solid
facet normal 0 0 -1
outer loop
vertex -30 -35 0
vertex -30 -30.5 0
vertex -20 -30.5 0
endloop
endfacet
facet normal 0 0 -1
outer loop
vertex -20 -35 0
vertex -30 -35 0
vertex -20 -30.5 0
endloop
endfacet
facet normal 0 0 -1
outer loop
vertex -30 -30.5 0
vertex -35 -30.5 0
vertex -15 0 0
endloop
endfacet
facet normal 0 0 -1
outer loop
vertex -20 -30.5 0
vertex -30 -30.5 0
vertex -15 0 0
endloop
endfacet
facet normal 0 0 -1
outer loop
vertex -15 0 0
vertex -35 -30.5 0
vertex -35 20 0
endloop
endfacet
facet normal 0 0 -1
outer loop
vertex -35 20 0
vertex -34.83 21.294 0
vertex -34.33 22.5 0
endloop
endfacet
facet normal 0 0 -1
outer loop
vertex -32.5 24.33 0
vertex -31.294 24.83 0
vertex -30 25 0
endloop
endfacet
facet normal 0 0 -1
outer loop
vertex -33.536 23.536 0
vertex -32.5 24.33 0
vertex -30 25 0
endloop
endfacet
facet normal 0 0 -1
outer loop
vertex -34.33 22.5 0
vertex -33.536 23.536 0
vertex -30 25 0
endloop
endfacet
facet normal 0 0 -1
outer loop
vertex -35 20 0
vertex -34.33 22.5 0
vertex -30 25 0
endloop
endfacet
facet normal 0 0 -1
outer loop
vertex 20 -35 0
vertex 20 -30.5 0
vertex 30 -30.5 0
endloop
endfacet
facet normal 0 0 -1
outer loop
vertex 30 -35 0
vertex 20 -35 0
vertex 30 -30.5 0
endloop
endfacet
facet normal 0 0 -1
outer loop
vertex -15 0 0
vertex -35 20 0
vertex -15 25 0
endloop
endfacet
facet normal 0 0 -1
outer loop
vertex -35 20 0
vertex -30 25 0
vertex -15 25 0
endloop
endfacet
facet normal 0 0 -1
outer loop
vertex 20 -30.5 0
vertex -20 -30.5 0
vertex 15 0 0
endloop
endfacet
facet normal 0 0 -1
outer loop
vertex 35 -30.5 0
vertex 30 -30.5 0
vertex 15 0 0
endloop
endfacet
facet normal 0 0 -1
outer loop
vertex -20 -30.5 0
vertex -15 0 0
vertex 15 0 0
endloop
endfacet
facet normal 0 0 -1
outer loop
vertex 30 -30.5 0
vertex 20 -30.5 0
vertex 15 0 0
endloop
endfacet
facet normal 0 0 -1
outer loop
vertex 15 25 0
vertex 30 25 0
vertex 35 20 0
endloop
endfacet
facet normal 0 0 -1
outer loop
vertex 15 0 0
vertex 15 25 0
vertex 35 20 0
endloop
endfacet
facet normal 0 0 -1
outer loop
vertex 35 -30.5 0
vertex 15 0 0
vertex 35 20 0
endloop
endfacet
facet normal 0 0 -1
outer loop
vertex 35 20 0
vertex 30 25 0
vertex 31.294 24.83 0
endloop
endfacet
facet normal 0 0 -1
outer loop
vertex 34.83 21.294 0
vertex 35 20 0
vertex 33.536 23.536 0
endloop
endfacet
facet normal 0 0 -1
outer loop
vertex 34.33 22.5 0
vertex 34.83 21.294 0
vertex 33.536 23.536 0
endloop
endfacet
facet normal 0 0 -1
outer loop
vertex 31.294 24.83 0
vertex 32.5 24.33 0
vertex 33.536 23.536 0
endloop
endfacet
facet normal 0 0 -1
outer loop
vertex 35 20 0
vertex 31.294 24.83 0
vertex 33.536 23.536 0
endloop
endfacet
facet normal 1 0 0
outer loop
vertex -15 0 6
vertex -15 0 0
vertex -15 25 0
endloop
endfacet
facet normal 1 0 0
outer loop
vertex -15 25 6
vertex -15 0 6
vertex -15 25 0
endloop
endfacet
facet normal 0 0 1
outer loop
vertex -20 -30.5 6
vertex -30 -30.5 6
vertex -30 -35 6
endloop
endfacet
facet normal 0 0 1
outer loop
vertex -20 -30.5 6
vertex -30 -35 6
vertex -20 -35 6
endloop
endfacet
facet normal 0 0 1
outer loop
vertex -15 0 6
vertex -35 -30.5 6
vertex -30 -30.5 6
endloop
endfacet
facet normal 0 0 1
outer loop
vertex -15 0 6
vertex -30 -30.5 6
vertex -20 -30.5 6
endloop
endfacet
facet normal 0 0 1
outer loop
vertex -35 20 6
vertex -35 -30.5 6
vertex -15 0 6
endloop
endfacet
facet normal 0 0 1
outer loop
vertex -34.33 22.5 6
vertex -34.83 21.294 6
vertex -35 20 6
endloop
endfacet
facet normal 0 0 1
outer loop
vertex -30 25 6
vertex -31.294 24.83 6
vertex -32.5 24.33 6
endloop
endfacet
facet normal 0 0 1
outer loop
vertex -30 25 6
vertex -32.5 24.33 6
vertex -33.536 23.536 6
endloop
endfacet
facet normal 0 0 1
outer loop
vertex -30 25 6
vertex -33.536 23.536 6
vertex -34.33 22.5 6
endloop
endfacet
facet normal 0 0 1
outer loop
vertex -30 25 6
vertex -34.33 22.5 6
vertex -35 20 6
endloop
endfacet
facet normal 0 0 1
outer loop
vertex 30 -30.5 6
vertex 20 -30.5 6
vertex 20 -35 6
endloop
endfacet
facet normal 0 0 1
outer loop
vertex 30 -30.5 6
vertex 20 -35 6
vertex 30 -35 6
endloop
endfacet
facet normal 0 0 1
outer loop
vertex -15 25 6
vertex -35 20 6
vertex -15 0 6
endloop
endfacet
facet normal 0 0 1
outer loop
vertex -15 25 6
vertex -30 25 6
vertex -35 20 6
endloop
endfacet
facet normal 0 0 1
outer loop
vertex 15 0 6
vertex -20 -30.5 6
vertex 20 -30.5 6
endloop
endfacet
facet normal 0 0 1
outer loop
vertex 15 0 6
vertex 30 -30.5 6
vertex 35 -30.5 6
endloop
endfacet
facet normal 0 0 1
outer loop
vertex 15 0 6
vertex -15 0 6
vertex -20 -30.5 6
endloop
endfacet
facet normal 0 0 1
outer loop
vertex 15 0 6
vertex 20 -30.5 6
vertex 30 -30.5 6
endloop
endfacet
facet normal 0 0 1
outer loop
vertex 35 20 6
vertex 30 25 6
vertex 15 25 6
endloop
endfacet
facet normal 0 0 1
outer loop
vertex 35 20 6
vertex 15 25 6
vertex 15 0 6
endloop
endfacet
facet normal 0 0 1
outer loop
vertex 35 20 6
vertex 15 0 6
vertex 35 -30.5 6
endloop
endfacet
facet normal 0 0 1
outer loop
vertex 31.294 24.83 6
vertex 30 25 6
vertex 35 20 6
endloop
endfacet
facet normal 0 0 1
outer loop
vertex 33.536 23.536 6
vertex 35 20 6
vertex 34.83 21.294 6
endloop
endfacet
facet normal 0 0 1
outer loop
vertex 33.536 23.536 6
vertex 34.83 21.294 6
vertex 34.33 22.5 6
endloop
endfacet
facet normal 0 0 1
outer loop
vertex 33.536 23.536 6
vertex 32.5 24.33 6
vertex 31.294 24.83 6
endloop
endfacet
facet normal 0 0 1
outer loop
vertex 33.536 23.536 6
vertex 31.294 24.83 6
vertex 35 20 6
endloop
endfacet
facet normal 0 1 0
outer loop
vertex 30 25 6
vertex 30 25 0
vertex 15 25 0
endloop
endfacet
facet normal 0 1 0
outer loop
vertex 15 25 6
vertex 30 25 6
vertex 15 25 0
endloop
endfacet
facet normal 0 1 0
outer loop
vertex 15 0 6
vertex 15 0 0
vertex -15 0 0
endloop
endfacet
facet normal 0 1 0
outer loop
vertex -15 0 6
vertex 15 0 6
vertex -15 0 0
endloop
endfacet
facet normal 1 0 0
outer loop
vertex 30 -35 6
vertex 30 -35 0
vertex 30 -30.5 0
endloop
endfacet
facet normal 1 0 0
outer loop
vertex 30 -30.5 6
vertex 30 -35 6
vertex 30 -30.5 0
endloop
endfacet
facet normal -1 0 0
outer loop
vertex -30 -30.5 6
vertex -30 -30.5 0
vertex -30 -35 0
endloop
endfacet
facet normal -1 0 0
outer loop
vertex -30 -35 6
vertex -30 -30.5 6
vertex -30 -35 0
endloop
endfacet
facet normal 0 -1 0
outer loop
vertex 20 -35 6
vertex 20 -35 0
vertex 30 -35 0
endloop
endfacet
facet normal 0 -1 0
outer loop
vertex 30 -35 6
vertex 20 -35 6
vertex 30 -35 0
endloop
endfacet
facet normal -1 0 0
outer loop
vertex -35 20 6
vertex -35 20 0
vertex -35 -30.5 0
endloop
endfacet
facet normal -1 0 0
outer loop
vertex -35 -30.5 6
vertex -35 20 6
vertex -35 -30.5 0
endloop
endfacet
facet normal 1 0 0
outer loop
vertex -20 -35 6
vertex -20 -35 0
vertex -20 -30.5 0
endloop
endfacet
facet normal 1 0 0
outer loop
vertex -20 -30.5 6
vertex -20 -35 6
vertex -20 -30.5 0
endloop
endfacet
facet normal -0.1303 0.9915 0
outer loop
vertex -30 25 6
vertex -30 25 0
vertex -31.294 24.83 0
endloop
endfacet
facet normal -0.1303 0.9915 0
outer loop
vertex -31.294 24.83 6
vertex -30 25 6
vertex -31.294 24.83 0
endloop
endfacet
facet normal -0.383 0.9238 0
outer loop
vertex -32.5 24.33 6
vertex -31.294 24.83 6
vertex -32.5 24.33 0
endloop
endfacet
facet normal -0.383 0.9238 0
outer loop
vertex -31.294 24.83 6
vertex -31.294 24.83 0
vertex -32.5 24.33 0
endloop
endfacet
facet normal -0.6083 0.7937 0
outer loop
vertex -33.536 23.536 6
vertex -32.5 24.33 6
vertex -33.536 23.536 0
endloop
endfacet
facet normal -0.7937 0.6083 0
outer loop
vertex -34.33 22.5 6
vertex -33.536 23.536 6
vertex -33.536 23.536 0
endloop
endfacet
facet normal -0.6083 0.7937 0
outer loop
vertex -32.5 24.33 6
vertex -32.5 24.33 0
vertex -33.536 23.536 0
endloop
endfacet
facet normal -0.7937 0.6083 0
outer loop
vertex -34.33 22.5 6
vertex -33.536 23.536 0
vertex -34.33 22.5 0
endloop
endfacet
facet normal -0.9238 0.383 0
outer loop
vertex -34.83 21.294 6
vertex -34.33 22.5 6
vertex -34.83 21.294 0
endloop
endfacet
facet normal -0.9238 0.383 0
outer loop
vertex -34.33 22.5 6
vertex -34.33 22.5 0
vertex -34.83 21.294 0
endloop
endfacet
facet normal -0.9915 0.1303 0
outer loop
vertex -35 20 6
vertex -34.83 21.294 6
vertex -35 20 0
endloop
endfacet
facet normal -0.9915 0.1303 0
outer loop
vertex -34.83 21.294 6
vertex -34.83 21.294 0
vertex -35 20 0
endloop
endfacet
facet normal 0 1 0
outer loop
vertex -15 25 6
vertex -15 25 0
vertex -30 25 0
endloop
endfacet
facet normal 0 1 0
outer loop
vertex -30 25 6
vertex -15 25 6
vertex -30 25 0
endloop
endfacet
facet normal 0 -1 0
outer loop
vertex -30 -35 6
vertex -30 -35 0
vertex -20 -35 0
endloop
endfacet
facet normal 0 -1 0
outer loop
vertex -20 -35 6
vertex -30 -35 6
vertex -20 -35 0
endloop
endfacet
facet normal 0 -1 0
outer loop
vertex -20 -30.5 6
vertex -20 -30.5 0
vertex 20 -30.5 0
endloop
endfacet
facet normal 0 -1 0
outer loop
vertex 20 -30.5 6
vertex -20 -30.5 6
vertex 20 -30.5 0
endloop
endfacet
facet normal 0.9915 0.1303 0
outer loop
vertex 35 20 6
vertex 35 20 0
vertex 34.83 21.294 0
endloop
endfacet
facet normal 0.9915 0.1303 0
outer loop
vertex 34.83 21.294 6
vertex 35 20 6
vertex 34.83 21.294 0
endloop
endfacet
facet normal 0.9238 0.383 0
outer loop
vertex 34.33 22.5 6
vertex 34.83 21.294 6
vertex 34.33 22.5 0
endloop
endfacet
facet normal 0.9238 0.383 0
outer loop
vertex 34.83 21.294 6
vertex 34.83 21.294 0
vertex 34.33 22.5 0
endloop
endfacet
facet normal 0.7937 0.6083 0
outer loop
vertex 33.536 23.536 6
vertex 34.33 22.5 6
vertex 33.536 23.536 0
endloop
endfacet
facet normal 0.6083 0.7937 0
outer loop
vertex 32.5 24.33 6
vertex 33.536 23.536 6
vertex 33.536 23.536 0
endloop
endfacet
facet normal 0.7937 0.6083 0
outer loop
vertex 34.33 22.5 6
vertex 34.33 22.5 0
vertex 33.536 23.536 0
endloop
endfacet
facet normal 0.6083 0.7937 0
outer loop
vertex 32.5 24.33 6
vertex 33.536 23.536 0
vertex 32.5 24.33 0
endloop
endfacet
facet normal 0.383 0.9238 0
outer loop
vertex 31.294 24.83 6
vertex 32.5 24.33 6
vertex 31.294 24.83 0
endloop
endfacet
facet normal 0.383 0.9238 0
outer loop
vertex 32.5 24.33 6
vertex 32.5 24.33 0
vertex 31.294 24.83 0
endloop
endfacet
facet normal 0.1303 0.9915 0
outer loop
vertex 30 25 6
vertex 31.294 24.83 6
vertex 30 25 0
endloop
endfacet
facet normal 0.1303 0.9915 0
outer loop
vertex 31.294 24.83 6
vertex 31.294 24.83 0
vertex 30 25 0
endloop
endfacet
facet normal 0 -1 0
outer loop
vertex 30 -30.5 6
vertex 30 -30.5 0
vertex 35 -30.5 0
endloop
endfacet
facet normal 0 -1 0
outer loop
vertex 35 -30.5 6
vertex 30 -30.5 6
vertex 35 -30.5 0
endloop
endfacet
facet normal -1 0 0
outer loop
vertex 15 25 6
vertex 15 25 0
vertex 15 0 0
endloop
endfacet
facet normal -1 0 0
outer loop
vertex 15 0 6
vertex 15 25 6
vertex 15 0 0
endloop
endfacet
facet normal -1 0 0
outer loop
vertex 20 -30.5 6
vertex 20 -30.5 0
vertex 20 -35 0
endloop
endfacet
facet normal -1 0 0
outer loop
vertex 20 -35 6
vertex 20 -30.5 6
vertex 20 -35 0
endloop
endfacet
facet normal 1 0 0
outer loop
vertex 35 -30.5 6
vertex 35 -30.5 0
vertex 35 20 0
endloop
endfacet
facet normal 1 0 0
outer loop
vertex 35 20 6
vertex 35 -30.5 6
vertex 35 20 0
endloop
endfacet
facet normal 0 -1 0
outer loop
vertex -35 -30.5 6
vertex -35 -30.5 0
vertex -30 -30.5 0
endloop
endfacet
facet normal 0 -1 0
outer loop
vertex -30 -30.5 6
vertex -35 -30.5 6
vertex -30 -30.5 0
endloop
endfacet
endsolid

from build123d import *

# Parameters (mm, degrees)
F1_DEPTH = 6


with BuildPart() as f1:
    # F0 (on Top) → F1 (new body)
    with BuildSketch(Plane.XY):
        with BuildLine():
            Line((-35, 20), (-35, -30.5))
            Line((-35, -30.5), (-30, -30.5))
            Line((-30, -30.5), (-30, -35))
            Line((-30, -35), (-20, -35))
            Line((-20, -35), (-20, -30.5))
            Line((-20, -30.5), (20, -30.5))
            Line((20, -30.5), (20, -35))
            Line((20, -35), (30, -35))
            Line((30, -35), (30, -30.5))
            Line((30, -30.5), (35, -30.5))
            Line((35, -30.5), (35, 20))
            ThreePointArc((35, 20), (33.535534, 23.535534), (30, 25))
            Line((30, 25), (15, 25))
            Line((15, 25), (15, 0))
            Line((15, 0), (-15, 0))
            Line((-15, 0), (-15, 25))
            Line((-15, 25), (-30, 25))
            ThreePointArc((-30, 25), (-33.535534, 23.535534), (-35, 20))
        make_face()
    extrude(amount=F1_DEPTH)


solid = f1.part
